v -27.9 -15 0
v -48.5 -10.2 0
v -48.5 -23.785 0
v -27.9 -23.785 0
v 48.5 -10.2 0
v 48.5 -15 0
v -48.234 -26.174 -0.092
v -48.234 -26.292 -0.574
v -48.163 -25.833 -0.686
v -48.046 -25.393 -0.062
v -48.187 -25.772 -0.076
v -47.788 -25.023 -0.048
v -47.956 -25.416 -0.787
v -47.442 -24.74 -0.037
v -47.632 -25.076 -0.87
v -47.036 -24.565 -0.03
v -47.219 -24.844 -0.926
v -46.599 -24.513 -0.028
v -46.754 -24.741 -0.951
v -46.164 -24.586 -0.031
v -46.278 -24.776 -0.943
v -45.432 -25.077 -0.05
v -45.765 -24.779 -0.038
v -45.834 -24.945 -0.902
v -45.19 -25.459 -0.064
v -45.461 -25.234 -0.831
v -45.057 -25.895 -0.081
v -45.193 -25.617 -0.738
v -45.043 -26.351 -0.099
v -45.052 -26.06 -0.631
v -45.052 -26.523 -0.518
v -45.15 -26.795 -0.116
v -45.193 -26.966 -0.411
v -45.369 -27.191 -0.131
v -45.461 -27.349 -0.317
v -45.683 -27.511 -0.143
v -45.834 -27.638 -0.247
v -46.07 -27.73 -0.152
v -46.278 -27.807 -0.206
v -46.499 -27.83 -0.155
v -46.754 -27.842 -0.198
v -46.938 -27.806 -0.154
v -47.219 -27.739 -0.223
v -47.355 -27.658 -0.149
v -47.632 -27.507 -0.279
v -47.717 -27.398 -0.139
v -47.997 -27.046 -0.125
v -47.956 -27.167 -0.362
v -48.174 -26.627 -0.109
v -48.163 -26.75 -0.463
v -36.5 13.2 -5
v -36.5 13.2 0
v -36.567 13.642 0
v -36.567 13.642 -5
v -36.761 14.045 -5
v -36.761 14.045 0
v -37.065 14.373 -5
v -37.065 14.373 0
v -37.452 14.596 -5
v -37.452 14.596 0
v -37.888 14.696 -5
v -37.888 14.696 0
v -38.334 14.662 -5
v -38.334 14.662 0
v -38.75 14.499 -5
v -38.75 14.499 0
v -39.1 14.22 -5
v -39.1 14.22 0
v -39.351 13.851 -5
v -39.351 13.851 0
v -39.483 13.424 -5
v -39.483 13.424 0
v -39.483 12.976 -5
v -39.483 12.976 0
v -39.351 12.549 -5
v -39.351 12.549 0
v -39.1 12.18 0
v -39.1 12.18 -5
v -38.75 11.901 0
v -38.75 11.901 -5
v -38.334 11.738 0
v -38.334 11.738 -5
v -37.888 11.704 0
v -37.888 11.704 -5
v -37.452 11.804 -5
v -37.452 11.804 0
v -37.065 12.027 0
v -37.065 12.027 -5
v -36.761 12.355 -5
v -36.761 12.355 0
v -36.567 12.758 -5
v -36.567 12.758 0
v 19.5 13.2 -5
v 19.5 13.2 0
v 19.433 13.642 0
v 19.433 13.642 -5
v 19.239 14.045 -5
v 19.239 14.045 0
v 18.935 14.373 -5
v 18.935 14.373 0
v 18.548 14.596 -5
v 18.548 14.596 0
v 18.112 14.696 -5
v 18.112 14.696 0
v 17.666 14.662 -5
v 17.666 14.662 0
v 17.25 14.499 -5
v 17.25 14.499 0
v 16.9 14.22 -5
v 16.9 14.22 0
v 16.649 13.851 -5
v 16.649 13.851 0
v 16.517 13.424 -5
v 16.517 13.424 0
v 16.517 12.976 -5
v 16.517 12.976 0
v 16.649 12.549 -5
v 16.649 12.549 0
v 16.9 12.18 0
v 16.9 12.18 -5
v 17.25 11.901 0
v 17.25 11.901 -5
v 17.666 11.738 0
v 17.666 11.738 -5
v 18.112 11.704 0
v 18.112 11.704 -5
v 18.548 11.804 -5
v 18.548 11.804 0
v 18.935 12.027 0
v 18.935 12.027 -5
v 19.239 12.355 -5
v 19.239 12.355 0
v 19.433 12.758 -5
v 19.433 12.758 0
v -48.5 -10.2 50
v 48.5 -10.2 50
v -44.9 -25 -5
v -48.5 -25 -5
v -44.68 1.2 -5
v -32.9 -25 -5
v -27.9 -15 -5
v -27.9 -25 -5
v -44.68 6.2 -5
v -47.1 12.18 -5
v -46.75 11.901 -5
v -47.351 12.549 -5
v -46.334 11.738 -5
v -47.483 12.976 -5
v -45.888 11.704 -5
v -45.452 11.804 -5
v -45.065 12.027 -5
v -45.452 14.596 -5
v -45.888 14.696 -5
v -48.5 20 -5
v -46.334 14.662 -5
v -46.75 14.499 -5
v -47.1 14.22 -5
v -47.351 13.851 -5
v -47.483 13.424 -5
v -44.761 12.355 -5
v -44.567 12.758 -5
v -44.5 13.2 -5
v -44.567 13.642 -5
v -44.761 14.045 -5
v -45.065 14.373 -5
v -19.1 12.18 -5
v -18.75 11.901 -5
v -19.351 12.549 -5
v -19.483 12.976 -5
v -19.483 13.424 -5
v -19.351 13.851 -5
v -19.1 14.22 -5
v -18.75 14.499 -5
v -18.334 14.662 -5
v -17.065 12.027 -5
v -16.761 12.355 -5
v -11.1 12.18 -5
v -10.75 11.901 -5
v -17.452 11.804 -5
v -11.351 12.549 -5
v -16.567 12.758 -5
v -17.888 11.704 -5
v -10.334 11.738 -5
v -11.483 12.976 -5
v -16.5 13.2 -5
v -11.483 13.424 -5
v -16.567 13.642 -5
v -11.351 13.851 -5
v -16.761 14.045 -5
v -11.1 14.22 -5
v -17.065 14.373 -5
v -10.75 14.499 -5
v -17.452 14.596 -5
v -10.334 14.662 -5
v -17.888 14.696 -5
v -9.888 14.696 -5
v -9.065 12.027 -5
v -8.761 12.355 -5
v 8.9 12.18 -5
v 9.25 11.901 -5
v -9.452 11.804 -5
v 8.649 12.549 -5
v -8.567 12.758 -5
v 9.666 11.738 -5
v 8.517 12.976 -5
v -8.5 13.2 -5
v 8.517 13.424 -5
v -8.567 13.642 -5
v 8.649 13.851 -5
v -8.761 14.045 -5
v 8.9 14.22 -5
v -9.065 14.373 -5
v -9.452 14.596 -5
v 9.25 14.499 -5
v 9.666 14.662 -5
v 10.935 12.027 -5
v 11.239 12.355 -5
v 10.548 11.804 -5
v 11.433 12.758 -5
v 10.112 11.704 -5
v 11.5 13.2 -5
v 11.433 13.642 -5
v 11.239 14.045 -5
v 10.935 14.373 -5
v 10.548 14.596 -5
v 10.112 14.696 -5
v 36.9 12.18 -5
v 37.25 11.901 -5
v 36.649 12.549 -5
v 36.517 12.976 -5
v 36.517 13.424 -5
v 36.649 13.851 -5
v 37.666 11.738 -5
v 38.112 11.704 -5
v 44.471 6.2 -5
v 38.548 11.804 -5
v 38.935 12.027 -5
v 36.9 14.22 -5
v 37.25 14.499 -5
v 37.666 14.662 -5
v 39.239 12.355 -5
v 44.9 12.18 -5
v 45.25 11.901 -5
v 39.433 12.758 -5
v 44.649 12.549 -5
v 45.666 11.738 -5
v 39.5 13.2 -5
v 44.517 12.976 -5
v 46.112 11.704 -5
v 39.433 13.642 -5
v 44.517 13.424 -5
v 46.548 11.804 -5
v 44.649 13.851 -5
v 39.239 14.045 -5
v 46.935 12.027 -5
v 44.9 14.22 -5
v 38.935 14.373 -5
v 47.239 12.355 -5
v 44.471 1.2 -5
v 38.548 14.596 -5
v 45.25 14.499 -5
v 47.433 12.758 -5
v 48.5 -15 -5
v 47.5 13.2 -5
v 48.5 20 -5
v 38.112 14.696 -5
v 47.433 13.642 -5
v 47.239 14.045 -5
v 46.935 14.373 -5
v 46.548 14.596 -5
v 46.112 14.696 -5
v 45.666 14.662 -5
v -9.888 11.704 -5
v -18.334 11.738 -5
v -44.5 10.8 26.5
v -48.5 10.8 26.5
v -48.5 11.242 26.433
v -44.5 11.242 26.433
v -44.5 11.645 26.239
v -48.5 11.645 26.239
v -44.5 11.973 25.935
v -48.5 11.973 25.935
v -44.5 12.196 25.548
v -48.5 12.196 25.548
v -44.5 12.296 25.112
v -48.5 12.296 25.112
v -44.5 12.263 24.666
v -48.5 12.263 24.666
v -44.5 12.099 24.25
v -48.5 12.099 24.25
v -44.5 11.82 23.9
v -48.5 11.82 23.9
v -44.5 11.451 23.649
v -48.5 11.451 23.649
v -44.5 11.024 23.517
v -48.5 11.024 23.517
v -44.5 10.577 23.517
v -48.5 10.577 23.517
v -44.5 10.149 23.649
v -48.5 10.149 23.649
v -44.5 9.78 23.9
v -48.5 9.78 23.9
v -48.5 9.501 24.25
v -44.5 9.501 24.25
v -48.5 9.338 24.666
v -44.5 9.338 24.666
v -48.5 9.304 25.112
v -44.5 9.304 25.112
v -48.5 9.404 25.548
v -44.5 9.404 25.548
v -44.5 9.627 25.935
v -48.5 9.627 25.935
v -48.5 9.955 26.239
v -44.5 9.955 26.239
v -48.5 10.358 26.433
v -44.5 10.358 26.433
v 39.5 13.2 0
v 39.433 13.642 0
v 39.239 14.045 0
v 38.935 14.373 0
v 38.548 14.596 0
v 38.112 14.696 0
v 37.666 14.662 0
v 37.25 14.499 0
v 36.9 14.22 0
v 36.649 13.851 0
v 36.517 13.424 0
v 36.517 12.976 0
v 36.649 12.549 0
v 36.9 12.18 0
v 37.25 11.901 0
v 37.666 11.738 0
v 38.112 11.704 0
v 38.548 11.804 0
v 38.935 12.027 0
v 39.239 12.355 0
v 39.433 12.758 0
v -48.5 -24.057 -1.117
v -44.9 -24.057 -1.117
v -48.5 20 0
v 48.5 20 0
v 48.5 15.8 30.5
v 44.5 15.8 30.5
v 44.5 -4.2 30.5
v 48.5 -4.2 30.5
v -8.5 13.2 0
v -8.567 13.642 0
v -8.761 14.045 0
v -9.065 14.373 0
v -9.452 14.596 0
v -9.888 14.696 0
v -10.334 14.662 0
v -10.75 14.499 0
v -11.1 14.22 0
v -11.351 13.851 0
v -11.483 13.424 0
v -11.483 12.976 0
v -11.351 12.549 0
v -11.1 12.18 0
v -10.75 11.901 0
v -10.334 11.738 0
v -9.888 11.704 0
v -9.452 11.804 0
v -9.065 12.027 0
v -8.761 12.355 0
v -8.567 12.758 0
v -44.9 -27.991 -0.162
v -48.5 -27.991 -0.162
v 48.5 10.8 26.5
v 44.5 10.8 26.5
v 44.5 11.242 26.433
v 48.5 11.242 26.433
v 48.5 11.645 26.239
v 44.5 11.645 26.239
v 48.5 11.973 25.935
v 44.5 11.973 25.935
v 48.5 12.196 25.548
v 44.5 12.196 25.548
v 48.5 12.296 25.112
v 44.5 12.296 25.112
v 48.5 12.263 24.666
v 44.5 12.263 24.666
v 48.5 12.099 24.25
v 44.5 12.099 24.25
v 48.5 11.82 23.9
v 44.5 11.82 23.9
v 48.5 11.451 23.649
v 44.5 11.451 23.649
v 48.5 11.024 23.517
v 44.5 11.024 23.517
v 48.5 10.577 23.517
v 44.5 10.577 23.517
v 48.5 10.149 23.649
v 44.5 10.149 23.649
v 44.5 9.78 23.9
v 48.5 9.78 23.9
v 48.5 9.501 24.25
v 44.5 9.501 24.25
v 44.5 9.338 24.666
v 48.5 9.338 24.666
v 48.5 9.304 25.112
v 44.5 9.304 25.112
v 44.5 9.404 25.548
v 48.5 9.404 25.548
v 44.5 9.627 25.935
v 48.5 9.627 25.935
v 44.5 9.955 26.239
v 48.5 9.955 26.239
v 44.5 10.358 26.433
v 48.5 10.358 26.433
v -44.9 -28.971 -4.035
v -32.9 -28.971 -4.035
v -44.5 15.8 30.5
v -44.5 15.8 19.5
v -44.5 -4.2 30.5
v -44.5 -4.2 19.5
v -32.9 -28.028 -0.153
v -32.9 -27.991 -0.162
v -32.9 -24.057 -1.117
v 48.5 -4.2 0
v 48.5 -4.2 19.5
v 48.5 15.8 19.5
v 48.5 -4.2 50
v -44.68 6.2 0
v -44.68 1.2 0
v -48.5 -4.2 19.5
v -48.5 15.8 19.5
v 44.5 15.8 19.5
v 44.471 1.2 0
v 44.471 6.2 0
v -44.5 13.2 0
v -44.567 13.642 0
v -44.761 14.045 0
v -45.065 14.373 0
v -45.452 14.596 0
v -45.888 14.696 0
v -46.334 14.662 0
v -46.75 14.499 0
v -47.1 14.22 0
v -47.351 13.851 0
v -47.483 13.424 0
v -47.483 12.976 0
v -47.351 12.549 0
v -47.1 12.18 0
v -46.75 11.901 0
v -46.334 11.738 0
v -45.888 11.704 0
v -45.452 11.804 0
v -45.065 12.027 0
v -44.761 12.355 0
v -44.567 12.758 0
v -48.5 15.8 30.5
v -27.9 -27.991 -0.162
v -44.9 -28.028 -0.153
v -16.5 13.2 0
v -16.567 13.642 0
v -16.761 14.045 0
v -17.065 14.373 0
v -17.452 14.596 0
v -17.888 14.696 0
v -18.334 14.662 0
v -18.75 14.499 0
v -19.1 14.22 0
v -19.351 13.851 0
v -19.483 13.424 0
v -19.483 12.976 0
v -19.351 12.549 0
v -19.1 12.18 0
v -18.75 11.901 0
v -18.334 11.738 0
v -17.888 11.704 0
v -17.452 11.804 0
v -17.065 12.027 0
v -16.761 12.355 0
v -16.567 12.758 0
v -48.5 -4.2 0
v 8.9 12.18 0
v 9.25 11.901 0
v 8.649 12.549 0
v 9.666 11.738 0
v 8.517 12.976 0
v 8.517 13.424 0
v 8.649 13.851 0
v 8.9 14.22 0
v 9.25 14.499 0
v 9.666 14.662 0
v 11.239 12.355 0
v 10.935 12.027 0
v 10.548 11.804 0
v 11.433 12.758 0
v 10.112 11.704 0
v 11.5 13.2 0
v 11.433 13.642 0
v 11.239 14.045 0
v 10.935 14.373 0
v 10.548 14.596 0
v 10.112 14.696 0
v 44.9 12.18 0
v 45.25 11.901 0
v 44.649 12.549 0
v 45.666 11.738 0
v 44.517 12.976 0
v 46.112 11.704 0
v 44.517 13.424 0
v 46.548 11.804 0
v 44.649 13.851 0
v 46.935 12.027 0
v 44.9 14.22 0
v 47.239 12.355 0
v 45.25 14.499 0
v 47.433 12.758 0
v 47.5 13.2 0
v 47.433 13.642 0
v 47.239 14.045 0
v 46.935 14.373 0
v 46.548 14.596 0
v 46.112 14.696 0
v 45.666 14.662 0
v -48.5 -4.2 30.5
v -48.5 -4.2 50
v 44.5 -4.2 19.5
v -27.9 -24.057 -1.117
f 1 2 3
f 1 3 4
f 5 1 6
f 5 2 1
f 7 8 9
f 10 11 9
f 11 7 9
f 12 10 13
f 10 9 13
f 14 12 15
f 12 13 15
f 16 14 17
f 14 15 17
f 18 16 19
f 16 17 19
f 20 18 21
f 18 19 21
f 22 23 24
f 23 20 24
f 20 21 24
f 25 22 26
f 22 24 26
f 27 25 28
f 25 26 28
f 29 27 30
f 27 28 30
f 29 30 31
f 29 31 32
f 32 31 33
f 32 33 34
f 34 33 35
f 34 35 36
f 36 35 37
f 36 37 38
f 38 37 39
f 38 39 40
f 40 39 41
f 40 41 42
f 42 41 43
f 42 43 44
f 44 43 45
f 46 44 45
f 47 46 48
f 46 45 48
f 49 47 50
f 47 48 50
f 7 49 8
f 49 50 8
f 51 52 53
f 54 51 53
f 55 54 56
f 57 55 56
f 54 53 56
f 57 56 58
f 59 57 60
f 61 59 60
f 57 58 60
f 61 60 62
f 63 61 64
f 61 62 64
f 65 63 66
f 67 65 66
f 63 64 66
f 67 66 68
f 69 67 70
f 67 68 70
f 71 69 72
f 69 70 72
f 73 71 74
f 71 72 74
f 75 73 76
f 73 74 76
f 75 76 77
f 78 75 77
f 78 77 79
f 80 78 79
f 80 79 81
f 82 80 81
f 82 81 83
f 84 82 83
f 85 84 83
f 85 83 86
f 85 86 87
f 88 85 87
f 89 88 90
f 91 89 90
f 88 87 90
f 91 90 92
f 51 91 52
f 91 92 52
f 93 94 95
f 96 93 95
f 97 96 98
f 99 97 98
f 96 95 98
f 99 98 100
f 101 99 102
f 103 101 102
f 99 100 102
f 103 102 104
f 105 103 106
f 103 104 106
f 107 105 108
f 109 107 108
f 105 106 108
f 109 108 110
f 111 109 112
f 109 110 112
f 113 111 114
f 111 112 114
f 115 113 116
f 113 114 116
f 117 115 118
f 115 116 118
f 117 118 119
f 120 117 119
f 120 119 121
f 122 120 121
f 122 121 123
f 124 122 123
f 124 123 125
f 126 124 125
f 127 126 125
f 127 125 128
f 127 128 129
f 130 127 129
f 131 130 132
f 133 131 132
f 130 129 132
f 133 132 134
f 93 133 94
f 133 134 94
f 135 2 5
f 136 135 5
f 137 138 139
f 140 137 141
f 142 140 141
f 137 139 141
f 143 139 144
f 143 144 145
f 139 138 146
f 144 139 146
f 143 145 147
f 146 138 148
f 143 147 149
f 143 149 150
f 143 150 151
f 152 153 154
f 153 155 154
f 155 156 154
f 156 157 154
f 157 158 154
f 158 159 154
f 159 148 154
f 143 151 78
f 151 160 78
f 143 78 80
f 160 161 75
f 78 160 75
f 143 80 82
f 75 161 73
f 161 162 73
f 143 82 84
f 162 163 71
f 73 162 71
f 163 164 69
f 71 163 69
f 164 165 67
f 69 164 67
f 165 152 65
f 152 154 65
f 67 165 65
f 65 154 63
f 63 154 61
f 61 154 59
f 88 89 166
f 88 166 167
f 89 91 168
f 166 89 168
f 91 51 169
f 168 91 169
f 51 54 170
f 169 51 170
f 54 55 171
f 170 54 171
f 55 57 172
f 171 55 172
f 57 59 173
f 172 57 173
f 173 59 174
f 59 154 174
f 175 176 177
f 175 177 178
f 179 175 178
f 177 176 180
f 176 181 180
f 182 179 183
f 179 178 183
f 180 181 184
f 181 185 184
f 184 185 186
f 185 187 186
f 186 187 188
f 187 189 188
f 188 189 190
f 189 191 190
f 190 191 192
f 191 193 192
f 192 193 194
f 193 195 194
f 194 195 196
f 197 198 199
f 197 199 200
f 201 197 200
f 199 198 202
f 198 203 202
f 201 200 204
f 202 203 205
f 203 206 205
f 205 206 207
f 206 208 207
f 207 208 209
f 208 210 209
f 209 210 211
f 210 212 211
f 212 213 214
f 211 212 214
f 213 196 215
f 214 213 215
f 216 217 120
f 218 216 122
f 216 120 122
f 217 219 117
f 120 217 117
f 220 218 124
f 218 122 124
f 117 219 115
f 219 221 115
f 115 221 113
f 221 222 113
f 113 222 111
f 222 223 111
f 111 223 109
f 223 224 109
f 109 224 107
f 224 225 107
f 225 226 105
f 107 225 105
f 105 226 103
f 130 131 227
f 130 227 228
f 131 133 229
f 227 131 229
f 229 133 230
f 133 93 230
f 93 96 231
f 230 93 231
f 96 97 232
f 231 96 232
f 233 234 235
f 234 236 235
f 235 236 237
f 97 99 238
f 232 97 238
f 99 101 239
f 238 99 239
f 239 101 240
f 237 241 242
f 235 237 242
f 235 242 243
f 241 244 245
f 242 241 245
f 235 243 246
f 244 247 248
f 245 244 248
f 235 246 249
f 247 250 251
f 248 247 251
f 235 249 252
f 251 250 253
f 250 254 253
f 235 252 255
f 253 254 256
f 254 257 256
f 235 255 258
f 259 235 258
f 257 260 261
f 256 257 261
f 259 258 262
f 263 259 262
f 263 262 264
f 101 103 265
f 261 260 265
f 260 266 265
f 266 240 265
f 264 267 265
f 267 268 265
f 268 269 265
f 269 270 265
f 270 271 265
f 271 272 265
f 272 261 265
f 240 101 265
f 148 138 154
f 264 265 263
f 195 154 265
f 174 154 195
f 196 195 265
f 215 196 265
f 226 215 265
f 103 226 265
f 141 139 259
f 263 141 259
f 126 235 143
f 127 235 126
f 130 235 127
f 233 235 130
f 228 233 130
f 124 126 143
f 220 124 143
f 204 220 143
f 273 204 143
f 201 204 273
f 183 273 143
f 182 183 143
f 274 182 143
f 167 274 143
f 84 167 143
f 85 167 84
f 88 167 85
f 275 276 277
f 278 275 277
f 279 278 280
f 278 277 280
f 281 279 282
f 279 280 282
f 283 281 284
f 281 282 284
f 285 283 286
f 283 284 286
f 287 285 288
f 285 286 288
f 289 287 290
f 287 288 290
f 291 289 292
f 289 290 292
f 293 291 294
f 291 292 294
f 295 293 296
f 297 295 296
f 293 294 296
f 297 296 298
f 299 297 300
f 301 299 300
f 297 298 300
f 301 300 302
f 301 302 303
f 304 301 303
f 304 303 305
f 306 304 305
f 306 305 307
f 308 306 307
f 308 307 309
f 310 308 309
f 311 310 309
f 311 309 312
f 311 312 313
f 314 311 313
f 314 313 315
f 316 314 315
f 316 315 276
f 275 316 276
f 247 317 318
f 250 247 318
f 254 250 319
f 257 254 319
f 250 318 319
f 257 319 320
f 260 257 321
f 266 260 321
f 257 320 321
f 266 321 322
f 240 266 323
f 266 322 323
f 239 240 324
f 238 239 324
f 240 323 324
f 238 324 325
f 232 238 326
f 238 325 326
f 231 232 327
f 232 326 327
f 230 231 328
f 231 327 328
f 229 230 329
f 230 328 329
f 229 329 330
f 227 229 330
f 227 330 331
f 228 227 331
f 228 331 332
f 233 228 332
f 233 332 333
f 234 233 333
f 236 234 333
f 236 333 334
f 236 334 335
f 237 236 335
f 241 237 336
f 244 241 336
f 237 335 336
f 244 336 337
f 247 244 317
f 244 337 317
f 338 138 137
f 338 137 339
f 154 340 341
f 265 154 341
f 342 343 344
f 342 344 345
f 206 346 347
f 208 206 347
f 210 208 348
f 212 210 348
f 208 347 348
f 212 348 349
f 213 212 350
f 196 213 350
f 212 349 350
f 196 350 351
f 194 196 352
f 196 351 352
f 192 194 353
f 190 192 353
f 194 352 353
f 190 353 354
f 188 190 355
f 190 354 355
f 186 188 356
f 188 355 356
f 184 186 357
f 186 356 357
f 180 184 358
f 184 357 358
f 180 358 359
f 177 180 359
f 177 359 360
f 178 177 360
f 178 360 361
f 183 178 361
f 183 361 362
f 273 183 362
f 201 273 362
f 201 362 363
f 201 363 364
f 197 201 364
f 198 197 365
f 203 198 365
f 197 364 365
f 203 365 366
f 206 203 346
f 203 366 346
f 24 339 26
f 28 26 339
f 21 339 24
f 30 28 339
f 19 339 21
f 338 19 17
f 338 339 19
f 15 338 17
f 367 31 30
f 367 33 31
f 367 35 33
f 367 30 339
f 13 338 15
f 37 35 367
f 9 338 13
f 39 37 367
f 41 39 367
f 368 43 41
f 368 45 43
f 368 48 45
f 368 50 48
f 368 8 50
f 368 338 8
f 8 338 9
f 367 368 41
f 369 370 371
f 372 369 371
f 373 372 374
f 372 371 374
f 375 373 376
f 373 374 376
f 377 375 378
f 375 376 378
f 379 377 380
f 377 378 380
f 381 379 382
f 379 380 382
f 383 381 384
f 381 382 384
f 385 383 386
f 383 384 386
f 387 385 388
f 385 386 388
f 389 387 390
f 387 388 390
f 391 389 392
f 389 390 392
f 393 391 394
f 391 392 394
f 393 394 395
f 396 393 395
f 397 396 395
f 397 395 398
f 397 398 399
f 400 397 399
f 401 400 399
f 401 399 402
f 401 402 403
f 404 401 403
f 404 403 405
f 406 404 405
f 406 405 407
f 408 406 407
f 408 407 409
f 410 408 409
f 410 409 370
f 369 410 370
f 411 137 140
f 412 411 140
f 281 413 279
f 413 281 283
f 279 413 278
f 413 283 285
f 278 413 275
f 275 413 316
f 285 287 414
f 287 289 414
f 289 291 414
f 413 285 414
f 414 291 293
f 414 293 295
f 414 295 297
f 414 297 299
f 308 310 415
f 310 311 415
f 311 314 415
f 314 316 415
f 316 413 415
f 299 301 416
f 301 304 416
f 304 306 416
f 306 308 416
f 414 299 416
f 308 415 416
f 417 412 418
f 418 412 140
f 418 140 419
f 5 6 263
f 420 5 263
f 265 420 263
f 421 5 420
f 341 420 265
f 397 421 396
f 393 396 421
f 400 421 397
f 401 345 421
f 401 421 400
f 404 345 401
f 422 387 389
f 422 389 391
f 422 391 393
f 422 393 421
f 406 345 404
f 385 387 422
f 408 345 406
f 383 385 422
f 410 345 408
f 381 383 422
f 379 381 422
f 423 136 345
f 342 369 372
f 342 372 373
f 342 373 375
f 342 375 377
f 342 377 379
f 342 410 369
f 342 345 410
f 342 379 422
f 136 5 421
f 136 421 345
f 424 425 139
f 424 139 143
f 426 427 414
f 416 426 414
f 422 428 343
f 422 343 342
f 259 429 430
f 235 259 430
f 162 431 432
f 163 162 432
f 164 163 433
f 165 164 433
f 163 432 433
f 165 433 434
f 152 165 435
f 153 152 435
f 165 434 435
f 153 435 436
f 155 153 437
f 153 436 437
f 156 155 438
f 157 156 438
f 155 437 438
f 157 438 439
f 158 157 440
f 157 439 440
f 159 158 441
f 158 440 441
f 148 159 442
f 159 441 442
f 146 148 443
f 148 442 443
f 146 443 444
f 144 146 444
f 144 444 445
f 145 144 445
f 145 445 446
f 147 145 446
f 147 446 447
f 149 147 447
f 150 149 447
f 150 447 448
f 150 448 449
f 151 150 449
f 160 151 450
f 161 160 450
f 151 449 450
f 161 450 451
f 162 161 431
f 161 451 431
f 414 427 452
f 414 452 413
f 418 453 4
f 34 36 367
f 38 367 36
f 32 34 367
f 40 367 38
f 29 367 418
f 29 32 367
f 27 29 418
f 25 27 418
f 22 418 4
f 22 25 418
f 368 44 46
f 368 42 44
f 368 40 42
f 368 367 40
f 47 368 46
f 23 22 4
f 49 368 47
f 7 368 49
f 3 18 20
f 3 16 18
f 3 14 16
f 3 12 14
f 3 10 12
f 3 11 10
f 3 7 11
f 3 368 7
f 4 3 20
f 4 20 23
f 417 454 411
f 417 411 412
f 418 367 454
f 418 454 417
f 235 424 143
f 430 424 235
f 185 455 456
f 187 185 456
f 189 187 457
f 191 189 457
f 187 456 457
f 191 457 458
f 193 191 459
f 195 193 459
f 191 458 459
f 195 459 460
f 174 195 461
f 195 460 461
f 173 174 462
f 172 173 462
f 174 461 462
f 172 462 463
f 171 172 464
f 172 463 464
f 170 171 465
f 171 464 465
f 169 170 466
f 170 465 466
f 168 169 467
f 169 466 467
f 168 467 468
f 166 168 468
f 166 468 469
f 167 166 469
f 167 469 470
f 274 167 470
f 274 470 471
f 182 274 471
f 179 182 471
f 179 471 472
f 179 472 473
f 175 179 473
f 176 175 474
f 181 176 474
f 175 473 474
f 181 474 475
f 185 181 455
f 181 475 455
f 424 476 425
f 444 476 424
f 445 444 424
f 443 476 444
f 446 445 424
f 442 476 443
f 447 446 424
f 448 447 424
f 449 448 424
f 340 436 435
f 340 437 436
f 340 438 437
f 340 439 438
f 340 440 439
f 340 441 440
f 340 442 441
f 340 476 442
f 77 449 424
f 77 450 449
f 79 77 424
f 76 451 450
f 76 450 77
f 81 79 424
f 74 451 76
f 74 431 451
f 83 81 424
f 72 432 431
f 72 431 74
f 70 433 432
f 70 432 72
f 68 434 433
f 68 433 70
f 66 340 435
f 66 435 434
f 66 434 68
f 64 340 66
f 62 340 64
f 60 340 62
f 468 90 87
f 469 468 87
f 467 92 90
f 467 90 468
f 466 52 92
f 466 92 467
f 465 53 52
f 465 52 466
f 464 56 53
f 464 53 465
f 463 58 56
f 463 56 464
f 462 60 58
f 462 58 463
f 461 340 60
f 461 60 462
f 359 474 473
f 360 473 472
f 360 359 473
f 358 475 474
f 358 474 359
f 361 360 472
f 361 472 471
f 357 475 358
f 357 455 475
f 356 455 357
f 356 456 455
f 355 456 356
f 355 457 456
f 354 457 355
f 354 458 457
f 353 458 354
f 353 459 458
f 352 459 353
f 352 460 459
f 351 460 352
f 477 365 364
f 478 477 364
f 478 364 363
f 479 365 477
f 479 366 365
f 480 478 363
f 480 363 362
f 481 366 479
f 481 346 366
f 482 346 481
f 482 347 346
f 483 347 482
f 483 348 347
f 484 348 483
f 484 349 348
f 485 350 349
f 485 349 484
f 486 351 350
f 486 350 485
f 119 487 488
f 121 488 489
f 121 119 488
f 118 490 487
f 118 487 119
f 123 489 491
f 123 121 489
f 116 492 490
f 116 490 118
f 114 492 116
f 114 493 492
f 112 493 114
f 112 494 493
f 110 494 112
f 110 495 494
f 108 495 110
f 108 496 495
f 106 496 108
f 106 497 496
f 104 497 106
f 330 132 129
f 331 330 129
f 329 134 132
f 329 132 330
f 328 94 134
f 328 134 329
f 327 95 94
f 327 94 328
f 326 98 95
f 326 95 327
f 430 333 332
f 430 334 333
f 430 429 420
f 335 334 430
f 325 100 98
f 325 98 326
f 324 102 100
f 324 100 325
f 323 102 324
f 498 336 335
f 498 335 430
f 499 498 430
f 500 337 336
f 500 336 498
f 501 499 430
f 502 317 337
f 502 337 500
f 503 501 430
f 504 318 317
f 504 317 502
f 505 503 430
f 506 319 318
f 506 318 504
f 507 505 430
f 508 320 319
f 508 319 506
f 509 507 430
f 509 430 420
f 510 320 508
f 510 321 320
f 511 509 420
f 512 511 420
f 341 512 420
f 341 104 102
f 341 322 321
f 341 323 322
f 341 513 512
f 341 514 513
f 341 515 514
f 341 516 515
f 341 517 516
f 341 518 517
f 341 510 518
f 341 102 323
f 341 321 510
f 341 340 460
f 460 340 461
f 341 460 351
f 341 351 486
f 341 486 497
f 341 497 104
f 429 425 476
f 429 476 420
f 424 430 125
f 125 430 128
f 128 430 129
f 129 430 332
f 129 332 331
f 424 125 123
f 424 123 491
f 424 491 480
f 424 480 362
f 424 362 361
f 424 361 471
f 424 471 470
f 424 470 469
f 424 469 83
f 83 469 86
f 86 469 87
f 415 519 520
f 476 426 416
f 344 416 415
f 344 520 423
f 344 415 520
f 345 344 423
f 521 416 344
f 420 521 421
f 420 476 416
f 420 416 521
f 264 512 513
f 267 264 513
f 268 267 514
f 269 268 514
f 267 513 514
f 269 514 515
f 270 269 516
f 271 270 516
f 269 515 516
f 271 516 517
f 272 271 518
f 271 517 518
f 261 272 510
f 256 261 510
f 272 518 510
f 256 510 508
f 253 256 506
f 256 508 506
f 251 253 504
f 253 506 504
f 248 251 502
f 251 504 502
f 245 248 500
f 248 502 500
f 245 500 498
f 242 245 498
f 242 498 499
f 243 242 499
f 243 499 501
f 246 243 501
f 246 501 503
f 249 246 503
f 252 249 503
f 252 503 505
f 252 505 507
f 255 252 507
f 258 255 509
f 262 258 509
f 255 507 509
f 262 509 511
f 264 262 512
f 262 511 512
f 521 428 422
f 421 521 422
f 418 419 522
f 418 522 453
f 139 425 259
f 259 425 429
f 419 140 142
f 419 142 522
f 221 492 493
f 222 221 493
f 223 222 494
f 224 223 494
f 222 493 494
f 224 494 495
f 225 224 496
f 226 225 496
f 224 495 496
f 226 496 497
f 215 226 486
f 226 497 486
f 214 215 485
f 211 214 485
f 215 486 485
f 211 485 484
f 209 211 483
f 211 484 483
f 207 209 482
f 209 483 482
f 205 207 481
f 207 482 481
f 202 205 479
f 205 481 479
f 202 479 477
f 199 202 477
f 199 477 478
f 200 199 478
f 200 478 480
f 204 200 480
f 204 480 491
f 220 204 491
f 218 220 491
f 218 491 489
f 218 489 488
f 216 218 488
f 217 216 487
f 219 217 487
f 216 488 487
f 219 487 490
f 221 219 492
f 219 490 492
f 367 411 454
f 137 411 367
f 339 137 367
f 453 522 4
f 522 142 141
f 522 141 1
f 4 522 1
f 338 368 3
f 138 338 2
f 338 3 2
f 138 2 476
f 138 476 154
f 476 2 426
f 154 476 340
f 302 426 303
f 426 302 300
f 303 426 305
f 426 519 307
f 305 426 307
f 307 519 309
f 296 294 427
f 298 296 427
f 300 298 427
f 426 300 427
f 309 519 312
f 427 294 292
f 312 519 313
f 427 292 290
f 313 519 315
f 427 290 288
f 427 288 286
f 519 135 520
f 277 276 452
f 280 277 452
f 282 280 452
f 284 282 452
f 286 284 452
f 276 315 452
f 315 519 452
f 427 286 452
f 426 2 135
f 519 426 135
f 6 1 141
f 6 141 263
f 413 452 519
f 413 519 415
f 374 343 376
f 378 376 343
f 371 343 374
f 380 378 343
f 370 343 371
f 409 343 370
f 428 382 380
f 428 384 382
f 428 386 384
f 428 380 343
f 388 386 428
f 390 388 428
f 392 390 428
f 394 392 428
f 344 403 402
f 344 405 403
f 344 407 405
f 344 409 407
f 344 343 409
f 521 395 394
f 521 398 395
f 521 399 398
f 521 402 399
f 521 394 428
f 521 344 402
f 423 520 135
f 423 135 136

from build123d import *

# Parameters (mm, degrees)
SKETCH1_W                      = 97
SKETCH1_H                      = 30
SKETCH1_R                      = 1.5
BOSS_EXTRUDE1_DEPTH            = 5
SKETCH2_W                      = 20.6
SKETCH2_H                      = 5
BOSS_EXTRUDE2_DEPTH            = 10
CUT_EXTRUDE1_REACH             = 99
CUT_EXTRUDE1_DIRECTION_2_DEPTH = 1
BOSS_EXTRUDE3_DEPTH            = 20.6
SKETCH5_W                      = 12
SKETCH5_H                      = 3.995489472
BOSS_EXTRUDE4_DEPTH            = 4.086588
SKETCH6_R                      = 1.6
CUT_EXTRUDE3_DEPTH             = 2
SKETCH7_W                      = 97
SKETCH7_H                      = 5
BOSS_EXTRUDE5_DEPTH            = 5
SKETCH8_W                      = 89.150949319
SKETCH8_H                      = 5
CUT_EXTRUDE5_DEPTH             = 6
SKETCH10_W                     = 97
SKETCH10_H                     = 6
BOSS_EXTRUDE7_DEPTH            = 50
SKETCH11_W                     = 4
SKETCH11_H                     = 11
BOSS_EXTRUDE8_DEPTH            = 20
SKETCH12_R                     = 1.5
CUT_EXTRUDE6_DEPTH             = 98


with BuildPart() as part:
    # Sketch1 → Boss-Extrude1 (new body)
    with BuildSketch(Plane.XY):
        Rectangle(SKETCH1_W, SKETCH1_H)
        with Locations((-46, 13.2)):
            Circle(SKETCH1_R, mode=Mode.SUBTRACT)
        with Locations((-38, 13.2)):
            Circle(SKETCH1_R, mode=Mode.SUBTRACT)
        with Locations((-18, 13.2)):
            Circle(SKETCH1_R, mode=Mode.SUBTRACT)
        with Locations((-10, 13.2)):
            Circle(SKETCH1_R, mode=Mode.SUBTRACT)
        with Locations((10, 13.2)):
            Circle(SKETCH1_R, mode=Mode.SUBTRACT)
        with Locations((18, 13.2)):
            Circle(SKETCH1_R, mode=Mode.SUBTRACT)
        with Locations((38, 13.2)):
            Circle(SKETCH1_R, mode=Mode.SUBTRACT)
        with Locations((46, 13.2)):
            Circle(SKETCH1_R, mode=Mode.SUBTRACT)
    extrude(amount=-BOSS_EXTRUDE1_DEPTH)

    # Sketch2 → Boss-Extrude2 (add)
    with BuildSketch(Plane.XZ.offset(15)):
        with Locations((-38.2, -2.5)):
            Rectangle(SKETCH2_W, SKETCH2_H)
    extrude(amount=BOSS_EXTRUDE2_DEPTH)

    # Sketch3 → Cut-Extrude1 (cut, up to next)
    with BuildSketch(Plane.ZY.offset(48.5), mode=Mode.PRIVATE) as cut_extrude1_sk1:
        Polygon((0, -25), (-5, -25), (0, -23.785067119), align=None)
    cut_extrude1_tool1 = extrude(cut_extrude1_sk1.sketch, amount=-CUT_EXTRUDE1_REACH, mode=Mode.PRIVATE) & part.part
    add(cut_extrude1_tool1.solids().sort_by_distance((-48.5, -24.595022, -1.666667))[0], mode=Mode.SUBTRACT)

    # Sketch3 → Cut-Extrude1 direction 2 (cut)
    with BuildSketch(Plane.ZY.offset(48.5)):
        Polygon((0, -25), (-5, -25), (0, -23.785067119), align=None)
    extrude(amount=CUT_EXTRUDE1_DIRECTION_2_DEPTH, mode=Mode.SUBTRACT)

    # Sketch4 → Boss-Extrude3 (add)
    with BuildSketch(Plane.ZY.offset(48.5)):
        Polygon((0, -23.785067119), (-1.117483581, -24.056600628), (-0.16158282, -27.990565936), align=None)
    extrude(amount=-BOSS_EXTRUDE3_DEPTH)

    # Sketch5 → Boss-Extrude4 (add)
    with BuildSketch(Plane(origin=(0, -22.459030354, 5.45724289), x_dir=(1, 0, 0), z_dir=(0, -0.971724853, 0.236116095))):
        with Locations((-38.9, -8.763781903)):
            Rectangle(SKETCH5_W, SKETCH5_H)
    extrude(amount=BOSS_EXTRUDE4_DEPTH)

    # Sketch6 → Cut-Extrude3 (cut)
    with BuildSketch(Plane(origin=(0, -1.597570275, -6.574726471), x_dir=(-1, 0, 0), z_dir=(0, -0.236116095, -0.971724853))):
        with Locations((46.634175133, -25.412540847)):
            Circle(SKETCH6_R)
    extrude(amount=-CUT_EXTRUDE3_DEPTH, mode=Mode.SUBTRACT)

    # Sketch7 → Boss-Extrude5 (add, through all)
    with BuildSketch(Plane.XY):
        with Locations((0, 17.5)):
            Rectangle(SKETCH7_W, SKETCH7_H)
    extrude(amount=-BOSS_EXTRUDE5_DEPTH)

    # Sketch8 → Cut-Extrude5 (cut, through all)
    with BuildSketch(Plane.XY):
        with Locations((-0.104637264, 3.7)):
            Rectangle(SKETCH8_W, SKETCH8_H)
    extrude(amount=-CUT_EXTRUDE5_DEPTH, mode=Mode.SUBTRACT)

    # Sketch10 → Boss-Extrude7 (add)
    with BuildSketch(Plane.XY):
        with Locations((0, -7.199863622)):
            Rectangle(SKETCH10_W, SKETCH10_H)
    extrude(amount=BOSS_EXTRUDE7_DEPTH)

    # Sketch11 → Boss-Extrude8 (add)
    with BuildSketch(Plane(origin=(0, -4.199863622, 0), x_dir=(1, 0, 0), z_dir=(0, 1, 0))):
        with Locations((46.5, -25)):
            Rectangle(SKETCH11_W, SKETCH11_H)
        with Locations((-46.5, -25)):
            Rectangle(SKETCH11_W, SKETCH11_H)
    extrude(amount=BOSS_EXTRUDE8_DEPTH)

    # Sketch12 → Cut-Extrude6 (cut, through all)
    with BuildSketch(Plane.ZY.offset(48.5)):
        with Locations((25, 10.800136378)):
            Circle(SKETCH12_R)
    extrude(amount=-CUT_EXTRUDE6_DEPTH, mode=Mode.SUBTRACT)


solid = part.part
